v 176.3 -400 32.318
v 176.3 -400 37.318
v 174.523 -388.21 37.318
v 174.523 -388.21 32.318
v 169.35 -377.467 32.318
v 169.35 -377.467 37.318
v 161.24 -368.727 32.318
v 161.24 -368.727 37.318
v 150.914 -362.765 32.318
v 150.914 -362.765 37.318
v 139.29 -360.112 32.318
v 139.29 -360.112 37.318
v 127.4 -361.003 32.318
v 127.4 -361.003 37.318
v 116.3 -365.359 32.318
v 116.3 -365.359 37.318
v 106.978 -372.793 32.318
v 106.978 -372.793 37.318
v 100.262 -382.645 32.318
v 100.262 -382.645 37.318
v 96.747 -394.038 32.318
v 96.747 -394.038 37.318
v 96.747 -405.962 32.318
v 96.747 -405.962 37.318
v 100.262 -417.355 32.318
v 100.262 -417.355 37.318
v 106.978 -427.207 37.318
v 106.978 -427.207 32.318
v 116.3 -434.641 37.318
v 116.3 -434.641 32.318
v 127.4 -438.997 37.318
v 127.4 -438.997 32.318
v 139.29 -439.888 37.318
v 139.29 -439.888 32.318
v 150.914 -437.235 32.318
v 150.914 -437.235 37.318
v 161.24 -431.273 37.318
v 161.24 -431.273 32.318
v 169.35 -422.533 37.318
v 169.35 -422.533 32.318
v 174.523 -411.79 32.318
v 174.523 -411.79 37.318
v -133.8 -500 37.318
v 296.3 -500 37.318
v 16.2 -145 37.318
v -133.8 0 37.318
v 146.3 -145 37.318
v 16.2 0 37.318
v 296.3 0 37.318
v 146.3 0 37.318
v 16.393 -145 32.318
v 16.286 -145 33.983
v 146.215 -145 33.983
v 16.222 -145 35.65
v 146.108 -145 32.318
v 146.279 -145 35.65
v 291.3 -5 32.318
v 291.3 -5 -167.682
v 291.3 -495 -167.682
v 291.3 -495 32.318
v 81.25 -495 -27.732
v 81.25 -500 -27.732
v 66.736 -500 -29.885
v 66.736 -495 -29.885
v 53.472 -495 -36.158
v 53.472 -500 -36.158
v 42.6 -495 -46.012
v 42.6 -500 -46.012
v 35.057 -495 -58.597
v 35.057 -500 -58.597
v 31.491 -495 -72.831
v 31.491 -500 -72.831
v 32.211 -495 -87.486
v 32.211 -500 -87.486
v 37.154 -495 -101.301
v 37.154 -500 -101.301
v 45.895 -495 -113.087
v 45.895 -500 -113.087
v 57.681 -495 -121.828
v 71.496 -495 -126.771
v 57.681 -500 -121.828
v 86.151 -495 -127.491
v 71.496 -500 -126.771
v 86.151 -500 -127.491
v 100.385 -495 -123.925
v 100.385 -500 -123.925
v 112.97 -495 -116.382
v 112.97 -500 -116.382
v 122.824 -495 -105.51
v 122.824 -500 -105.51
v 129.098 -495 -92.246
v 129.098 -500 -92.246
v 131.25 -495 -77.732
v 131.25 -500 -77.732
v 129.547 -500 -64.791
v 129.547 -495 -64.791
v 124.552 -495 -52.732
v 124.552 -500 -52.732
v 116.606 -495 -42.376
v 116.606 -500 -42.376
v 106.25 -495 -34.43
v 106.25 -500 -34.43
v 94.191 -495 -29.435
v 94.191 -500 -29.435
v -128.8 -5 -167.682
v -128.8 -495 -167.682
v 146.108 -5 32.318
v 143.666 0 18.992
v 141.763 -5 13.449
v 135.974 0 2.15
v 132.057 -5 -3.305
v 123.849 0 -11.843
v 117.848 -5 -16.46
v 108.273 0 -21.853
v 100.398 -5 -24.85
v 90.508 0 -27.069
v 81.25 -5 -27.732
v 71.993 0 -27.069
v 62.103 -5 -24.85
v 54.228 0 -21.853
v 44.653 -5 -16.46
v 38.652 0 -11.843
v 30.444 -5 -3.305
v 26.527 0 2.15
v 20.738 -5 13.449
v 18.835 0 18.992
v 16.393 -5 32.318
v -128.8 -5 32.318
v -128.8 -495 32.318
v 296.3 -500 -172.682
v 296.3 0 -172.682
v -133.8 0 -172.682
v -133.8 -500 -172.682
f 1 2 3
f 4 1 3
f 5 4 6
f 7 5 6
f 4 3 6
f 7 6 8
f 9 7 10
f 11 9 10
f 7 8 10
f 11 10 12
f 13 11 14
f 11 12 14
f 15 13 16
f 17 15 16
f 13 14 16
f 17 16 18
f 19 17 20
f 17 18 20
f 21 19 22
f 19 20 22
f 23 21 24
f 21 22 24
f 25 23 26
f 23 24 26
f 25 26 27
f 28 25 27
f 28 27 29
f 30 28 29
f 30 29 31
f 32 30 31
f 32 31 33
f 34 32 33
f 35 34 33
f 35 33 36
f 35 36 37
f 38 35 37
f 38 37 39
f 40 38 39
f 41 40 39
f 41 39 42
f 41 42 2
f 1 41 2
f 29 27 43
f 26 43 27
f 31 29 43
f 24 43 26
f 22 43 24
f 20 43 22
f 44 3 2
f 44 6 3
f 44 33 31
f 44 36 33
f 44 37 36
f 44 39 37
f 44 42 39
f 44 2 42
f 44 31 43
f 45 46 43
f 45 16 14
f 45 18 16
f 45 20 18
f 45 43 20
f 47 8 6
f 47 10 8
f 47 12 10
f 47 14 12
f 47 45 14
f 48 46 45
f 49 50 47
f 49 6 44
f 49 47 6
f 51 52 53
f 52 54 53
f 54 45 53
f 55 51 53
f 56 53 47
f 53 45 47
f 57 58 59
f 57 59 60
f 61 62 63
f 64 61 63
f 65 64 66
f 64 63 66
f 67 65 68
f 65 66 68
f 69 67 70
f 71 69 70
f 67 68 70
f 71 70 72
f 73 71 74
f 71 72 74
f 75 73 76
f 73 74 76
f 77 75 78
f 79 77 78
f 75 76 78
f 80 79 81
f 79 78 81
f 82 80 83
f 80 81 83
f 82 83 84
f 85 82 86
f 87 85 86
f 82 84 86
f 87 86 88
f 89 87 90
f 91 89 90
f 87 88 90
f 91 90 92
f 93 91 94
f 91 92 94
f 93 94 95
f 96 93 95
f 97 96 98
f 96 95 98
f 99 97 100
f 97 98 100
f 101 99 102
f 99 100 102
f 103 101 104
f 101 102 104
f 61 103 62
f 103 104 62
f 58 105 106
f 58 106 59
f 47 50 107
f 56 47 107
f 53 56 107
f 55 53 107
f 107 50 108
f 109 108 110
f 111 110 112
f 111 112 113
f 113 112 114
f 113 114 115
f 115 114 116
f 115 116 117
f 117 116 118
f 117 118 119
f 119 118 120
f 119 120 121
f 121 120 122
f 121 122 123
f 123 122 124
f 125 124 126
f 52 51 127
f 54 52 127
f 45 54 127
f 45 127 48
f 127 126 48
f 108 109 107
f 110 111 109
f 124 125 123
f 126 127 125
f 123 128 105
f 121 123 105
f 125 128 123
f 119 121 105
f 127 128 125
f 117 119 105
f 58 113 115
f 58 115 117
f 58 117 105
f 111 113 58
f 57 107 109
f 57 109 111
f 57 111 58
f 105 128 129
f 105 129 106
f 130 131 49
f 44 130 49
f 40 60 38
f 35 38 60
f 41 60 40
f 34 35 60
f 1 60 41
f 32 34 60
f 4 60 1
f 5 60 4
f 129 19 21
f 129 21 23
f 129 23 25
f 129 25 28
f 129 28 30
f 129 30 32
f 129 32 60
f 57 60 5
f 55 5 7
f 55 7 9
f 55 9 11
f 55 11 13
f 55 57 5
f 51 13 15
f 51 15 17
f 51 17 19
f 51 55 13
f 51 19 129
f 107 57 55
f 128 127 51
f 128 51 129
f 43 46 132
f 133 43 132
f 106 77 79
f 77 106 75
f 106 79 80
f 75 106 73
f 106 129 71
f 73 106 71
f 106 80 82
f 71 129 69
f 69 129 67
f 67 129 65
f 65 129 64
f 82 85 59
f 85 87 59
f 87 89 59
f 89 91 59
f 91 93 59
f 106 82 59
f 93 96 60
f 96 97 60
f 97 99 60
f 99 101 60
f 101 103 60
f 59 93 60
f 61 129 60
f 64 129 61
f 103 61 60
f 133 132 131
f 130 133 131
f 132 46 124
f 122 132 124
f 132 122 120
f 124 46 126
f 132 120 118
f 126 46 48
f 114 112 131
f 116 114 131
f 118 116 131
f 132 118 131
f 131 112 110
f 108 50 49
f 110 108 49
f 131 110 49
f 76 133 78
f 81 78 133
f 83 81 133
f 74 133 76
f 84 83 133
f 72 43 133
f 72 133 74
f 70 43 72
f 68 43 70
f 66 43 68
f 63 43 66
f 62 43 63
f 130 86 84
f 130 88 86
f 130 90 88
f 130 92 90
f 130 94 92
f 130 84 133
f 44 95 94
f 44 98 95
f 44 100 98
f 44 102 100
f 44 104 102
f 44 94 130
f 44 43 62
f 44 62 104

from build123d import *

# Parameters (mm, degrees)
F1_DEPTH = 500
F2_T     = -5
F4_DEPTH = 5
F5_DEPTH = 10
F6_W     = 130.1
F6_H     = 350
F7_DEPTH = 5
F8_R     = 40
F9_DEPTH = 25


# Not quite as in the source:
# - a feature names something its author has since deleted; it is built from what else it names


with BuildPart() as f1:
    # F0 (on Front) → F1 (new body)
    with BuildSketch(Plane.XZ):
        with BuildLine():
            Line((-133.7995099491, 37.318477902), (-133.7995099491, -172.681522098))
            Line((-133.7995099491, -172.681522098), (296.3004900509, -172.681522098))
            Line((296.3004900509, -172.681522098), (296.3004900509, 37.318477902))
            Line((296.3004900509, 37.318477902), (146.3004900509, 37.318477902))
            ThreePointArc((146.3004900509, 37.318477902), (81.2504900509, -27.731522098), (16.2004900509, 37.318477902))
            Line((16.2004900509, 37.318477902), (-133.7995099491, 37.318477902))
        make_face()
    extrude(amount=F1_DEPTH)

    # F2
    f2_openings = [f1.faces().sort_by_distance(p)[0] for p in [
        (81.25049, -250, -27.731522),
    ]]
    offset(amount=F2_T, openings=f2_openings)

    # F3 (on face) → F4 (join)
    with BuildSketch(Plane.XZ.offset(500)):
        with BuildLine():
            Line((146.3004900509, 37.318477902), (16.2004900509, 37.318477902))
            ThreePointArc((16.2004900509, 37.318477902), (35.2531939347, -8.6788182142), (81.2504900509, -27.731522098))
            ThreePointArc((81.2504900509, -27.731522098), (127.2477861671, -8.6788182142), (146.3004900509, 37.318477902))
        make_face()
    extrude(amount=-F4_DEPTH)

    # F3 (on face) → F5 (cut)
    with BuildSketch(Plane.XZ.offset(500)):
        with BuildLine():
            ThreePointArc((81.2504900509, -27.731522098), (45.8951509916, -113.0868611574), (131.2504900509, -77.731522098))
            ThreePointArc((131.2504900509, -77.731522098), (116.6058291102, -42.3761830387), (81.2504900509, -27.731522098))
        make_face()
    extrude(amount=-F5_DEPTH, mode=Mode.SUBTRACT)

    # F6 (on face) → F7 (join)
    with BuildSketch(Plane.XY.offset(37.318477902)):
        with Locations((81.2504900509, -320)):
            Rectangle(F6_W, F6_H)
    extrude(amount=-F7_DEPTH)

    # F8 (on face) → F9 (cut)
    with BuildSketch(Plane.XY.offset(37.318477902)):
        with Locations((136.3004900509, -400)):
            Circle(F8_R)
    extrude(amount=-F9_DEPTH, mode=Mode.SUBTRACT)


solid = f1.part
